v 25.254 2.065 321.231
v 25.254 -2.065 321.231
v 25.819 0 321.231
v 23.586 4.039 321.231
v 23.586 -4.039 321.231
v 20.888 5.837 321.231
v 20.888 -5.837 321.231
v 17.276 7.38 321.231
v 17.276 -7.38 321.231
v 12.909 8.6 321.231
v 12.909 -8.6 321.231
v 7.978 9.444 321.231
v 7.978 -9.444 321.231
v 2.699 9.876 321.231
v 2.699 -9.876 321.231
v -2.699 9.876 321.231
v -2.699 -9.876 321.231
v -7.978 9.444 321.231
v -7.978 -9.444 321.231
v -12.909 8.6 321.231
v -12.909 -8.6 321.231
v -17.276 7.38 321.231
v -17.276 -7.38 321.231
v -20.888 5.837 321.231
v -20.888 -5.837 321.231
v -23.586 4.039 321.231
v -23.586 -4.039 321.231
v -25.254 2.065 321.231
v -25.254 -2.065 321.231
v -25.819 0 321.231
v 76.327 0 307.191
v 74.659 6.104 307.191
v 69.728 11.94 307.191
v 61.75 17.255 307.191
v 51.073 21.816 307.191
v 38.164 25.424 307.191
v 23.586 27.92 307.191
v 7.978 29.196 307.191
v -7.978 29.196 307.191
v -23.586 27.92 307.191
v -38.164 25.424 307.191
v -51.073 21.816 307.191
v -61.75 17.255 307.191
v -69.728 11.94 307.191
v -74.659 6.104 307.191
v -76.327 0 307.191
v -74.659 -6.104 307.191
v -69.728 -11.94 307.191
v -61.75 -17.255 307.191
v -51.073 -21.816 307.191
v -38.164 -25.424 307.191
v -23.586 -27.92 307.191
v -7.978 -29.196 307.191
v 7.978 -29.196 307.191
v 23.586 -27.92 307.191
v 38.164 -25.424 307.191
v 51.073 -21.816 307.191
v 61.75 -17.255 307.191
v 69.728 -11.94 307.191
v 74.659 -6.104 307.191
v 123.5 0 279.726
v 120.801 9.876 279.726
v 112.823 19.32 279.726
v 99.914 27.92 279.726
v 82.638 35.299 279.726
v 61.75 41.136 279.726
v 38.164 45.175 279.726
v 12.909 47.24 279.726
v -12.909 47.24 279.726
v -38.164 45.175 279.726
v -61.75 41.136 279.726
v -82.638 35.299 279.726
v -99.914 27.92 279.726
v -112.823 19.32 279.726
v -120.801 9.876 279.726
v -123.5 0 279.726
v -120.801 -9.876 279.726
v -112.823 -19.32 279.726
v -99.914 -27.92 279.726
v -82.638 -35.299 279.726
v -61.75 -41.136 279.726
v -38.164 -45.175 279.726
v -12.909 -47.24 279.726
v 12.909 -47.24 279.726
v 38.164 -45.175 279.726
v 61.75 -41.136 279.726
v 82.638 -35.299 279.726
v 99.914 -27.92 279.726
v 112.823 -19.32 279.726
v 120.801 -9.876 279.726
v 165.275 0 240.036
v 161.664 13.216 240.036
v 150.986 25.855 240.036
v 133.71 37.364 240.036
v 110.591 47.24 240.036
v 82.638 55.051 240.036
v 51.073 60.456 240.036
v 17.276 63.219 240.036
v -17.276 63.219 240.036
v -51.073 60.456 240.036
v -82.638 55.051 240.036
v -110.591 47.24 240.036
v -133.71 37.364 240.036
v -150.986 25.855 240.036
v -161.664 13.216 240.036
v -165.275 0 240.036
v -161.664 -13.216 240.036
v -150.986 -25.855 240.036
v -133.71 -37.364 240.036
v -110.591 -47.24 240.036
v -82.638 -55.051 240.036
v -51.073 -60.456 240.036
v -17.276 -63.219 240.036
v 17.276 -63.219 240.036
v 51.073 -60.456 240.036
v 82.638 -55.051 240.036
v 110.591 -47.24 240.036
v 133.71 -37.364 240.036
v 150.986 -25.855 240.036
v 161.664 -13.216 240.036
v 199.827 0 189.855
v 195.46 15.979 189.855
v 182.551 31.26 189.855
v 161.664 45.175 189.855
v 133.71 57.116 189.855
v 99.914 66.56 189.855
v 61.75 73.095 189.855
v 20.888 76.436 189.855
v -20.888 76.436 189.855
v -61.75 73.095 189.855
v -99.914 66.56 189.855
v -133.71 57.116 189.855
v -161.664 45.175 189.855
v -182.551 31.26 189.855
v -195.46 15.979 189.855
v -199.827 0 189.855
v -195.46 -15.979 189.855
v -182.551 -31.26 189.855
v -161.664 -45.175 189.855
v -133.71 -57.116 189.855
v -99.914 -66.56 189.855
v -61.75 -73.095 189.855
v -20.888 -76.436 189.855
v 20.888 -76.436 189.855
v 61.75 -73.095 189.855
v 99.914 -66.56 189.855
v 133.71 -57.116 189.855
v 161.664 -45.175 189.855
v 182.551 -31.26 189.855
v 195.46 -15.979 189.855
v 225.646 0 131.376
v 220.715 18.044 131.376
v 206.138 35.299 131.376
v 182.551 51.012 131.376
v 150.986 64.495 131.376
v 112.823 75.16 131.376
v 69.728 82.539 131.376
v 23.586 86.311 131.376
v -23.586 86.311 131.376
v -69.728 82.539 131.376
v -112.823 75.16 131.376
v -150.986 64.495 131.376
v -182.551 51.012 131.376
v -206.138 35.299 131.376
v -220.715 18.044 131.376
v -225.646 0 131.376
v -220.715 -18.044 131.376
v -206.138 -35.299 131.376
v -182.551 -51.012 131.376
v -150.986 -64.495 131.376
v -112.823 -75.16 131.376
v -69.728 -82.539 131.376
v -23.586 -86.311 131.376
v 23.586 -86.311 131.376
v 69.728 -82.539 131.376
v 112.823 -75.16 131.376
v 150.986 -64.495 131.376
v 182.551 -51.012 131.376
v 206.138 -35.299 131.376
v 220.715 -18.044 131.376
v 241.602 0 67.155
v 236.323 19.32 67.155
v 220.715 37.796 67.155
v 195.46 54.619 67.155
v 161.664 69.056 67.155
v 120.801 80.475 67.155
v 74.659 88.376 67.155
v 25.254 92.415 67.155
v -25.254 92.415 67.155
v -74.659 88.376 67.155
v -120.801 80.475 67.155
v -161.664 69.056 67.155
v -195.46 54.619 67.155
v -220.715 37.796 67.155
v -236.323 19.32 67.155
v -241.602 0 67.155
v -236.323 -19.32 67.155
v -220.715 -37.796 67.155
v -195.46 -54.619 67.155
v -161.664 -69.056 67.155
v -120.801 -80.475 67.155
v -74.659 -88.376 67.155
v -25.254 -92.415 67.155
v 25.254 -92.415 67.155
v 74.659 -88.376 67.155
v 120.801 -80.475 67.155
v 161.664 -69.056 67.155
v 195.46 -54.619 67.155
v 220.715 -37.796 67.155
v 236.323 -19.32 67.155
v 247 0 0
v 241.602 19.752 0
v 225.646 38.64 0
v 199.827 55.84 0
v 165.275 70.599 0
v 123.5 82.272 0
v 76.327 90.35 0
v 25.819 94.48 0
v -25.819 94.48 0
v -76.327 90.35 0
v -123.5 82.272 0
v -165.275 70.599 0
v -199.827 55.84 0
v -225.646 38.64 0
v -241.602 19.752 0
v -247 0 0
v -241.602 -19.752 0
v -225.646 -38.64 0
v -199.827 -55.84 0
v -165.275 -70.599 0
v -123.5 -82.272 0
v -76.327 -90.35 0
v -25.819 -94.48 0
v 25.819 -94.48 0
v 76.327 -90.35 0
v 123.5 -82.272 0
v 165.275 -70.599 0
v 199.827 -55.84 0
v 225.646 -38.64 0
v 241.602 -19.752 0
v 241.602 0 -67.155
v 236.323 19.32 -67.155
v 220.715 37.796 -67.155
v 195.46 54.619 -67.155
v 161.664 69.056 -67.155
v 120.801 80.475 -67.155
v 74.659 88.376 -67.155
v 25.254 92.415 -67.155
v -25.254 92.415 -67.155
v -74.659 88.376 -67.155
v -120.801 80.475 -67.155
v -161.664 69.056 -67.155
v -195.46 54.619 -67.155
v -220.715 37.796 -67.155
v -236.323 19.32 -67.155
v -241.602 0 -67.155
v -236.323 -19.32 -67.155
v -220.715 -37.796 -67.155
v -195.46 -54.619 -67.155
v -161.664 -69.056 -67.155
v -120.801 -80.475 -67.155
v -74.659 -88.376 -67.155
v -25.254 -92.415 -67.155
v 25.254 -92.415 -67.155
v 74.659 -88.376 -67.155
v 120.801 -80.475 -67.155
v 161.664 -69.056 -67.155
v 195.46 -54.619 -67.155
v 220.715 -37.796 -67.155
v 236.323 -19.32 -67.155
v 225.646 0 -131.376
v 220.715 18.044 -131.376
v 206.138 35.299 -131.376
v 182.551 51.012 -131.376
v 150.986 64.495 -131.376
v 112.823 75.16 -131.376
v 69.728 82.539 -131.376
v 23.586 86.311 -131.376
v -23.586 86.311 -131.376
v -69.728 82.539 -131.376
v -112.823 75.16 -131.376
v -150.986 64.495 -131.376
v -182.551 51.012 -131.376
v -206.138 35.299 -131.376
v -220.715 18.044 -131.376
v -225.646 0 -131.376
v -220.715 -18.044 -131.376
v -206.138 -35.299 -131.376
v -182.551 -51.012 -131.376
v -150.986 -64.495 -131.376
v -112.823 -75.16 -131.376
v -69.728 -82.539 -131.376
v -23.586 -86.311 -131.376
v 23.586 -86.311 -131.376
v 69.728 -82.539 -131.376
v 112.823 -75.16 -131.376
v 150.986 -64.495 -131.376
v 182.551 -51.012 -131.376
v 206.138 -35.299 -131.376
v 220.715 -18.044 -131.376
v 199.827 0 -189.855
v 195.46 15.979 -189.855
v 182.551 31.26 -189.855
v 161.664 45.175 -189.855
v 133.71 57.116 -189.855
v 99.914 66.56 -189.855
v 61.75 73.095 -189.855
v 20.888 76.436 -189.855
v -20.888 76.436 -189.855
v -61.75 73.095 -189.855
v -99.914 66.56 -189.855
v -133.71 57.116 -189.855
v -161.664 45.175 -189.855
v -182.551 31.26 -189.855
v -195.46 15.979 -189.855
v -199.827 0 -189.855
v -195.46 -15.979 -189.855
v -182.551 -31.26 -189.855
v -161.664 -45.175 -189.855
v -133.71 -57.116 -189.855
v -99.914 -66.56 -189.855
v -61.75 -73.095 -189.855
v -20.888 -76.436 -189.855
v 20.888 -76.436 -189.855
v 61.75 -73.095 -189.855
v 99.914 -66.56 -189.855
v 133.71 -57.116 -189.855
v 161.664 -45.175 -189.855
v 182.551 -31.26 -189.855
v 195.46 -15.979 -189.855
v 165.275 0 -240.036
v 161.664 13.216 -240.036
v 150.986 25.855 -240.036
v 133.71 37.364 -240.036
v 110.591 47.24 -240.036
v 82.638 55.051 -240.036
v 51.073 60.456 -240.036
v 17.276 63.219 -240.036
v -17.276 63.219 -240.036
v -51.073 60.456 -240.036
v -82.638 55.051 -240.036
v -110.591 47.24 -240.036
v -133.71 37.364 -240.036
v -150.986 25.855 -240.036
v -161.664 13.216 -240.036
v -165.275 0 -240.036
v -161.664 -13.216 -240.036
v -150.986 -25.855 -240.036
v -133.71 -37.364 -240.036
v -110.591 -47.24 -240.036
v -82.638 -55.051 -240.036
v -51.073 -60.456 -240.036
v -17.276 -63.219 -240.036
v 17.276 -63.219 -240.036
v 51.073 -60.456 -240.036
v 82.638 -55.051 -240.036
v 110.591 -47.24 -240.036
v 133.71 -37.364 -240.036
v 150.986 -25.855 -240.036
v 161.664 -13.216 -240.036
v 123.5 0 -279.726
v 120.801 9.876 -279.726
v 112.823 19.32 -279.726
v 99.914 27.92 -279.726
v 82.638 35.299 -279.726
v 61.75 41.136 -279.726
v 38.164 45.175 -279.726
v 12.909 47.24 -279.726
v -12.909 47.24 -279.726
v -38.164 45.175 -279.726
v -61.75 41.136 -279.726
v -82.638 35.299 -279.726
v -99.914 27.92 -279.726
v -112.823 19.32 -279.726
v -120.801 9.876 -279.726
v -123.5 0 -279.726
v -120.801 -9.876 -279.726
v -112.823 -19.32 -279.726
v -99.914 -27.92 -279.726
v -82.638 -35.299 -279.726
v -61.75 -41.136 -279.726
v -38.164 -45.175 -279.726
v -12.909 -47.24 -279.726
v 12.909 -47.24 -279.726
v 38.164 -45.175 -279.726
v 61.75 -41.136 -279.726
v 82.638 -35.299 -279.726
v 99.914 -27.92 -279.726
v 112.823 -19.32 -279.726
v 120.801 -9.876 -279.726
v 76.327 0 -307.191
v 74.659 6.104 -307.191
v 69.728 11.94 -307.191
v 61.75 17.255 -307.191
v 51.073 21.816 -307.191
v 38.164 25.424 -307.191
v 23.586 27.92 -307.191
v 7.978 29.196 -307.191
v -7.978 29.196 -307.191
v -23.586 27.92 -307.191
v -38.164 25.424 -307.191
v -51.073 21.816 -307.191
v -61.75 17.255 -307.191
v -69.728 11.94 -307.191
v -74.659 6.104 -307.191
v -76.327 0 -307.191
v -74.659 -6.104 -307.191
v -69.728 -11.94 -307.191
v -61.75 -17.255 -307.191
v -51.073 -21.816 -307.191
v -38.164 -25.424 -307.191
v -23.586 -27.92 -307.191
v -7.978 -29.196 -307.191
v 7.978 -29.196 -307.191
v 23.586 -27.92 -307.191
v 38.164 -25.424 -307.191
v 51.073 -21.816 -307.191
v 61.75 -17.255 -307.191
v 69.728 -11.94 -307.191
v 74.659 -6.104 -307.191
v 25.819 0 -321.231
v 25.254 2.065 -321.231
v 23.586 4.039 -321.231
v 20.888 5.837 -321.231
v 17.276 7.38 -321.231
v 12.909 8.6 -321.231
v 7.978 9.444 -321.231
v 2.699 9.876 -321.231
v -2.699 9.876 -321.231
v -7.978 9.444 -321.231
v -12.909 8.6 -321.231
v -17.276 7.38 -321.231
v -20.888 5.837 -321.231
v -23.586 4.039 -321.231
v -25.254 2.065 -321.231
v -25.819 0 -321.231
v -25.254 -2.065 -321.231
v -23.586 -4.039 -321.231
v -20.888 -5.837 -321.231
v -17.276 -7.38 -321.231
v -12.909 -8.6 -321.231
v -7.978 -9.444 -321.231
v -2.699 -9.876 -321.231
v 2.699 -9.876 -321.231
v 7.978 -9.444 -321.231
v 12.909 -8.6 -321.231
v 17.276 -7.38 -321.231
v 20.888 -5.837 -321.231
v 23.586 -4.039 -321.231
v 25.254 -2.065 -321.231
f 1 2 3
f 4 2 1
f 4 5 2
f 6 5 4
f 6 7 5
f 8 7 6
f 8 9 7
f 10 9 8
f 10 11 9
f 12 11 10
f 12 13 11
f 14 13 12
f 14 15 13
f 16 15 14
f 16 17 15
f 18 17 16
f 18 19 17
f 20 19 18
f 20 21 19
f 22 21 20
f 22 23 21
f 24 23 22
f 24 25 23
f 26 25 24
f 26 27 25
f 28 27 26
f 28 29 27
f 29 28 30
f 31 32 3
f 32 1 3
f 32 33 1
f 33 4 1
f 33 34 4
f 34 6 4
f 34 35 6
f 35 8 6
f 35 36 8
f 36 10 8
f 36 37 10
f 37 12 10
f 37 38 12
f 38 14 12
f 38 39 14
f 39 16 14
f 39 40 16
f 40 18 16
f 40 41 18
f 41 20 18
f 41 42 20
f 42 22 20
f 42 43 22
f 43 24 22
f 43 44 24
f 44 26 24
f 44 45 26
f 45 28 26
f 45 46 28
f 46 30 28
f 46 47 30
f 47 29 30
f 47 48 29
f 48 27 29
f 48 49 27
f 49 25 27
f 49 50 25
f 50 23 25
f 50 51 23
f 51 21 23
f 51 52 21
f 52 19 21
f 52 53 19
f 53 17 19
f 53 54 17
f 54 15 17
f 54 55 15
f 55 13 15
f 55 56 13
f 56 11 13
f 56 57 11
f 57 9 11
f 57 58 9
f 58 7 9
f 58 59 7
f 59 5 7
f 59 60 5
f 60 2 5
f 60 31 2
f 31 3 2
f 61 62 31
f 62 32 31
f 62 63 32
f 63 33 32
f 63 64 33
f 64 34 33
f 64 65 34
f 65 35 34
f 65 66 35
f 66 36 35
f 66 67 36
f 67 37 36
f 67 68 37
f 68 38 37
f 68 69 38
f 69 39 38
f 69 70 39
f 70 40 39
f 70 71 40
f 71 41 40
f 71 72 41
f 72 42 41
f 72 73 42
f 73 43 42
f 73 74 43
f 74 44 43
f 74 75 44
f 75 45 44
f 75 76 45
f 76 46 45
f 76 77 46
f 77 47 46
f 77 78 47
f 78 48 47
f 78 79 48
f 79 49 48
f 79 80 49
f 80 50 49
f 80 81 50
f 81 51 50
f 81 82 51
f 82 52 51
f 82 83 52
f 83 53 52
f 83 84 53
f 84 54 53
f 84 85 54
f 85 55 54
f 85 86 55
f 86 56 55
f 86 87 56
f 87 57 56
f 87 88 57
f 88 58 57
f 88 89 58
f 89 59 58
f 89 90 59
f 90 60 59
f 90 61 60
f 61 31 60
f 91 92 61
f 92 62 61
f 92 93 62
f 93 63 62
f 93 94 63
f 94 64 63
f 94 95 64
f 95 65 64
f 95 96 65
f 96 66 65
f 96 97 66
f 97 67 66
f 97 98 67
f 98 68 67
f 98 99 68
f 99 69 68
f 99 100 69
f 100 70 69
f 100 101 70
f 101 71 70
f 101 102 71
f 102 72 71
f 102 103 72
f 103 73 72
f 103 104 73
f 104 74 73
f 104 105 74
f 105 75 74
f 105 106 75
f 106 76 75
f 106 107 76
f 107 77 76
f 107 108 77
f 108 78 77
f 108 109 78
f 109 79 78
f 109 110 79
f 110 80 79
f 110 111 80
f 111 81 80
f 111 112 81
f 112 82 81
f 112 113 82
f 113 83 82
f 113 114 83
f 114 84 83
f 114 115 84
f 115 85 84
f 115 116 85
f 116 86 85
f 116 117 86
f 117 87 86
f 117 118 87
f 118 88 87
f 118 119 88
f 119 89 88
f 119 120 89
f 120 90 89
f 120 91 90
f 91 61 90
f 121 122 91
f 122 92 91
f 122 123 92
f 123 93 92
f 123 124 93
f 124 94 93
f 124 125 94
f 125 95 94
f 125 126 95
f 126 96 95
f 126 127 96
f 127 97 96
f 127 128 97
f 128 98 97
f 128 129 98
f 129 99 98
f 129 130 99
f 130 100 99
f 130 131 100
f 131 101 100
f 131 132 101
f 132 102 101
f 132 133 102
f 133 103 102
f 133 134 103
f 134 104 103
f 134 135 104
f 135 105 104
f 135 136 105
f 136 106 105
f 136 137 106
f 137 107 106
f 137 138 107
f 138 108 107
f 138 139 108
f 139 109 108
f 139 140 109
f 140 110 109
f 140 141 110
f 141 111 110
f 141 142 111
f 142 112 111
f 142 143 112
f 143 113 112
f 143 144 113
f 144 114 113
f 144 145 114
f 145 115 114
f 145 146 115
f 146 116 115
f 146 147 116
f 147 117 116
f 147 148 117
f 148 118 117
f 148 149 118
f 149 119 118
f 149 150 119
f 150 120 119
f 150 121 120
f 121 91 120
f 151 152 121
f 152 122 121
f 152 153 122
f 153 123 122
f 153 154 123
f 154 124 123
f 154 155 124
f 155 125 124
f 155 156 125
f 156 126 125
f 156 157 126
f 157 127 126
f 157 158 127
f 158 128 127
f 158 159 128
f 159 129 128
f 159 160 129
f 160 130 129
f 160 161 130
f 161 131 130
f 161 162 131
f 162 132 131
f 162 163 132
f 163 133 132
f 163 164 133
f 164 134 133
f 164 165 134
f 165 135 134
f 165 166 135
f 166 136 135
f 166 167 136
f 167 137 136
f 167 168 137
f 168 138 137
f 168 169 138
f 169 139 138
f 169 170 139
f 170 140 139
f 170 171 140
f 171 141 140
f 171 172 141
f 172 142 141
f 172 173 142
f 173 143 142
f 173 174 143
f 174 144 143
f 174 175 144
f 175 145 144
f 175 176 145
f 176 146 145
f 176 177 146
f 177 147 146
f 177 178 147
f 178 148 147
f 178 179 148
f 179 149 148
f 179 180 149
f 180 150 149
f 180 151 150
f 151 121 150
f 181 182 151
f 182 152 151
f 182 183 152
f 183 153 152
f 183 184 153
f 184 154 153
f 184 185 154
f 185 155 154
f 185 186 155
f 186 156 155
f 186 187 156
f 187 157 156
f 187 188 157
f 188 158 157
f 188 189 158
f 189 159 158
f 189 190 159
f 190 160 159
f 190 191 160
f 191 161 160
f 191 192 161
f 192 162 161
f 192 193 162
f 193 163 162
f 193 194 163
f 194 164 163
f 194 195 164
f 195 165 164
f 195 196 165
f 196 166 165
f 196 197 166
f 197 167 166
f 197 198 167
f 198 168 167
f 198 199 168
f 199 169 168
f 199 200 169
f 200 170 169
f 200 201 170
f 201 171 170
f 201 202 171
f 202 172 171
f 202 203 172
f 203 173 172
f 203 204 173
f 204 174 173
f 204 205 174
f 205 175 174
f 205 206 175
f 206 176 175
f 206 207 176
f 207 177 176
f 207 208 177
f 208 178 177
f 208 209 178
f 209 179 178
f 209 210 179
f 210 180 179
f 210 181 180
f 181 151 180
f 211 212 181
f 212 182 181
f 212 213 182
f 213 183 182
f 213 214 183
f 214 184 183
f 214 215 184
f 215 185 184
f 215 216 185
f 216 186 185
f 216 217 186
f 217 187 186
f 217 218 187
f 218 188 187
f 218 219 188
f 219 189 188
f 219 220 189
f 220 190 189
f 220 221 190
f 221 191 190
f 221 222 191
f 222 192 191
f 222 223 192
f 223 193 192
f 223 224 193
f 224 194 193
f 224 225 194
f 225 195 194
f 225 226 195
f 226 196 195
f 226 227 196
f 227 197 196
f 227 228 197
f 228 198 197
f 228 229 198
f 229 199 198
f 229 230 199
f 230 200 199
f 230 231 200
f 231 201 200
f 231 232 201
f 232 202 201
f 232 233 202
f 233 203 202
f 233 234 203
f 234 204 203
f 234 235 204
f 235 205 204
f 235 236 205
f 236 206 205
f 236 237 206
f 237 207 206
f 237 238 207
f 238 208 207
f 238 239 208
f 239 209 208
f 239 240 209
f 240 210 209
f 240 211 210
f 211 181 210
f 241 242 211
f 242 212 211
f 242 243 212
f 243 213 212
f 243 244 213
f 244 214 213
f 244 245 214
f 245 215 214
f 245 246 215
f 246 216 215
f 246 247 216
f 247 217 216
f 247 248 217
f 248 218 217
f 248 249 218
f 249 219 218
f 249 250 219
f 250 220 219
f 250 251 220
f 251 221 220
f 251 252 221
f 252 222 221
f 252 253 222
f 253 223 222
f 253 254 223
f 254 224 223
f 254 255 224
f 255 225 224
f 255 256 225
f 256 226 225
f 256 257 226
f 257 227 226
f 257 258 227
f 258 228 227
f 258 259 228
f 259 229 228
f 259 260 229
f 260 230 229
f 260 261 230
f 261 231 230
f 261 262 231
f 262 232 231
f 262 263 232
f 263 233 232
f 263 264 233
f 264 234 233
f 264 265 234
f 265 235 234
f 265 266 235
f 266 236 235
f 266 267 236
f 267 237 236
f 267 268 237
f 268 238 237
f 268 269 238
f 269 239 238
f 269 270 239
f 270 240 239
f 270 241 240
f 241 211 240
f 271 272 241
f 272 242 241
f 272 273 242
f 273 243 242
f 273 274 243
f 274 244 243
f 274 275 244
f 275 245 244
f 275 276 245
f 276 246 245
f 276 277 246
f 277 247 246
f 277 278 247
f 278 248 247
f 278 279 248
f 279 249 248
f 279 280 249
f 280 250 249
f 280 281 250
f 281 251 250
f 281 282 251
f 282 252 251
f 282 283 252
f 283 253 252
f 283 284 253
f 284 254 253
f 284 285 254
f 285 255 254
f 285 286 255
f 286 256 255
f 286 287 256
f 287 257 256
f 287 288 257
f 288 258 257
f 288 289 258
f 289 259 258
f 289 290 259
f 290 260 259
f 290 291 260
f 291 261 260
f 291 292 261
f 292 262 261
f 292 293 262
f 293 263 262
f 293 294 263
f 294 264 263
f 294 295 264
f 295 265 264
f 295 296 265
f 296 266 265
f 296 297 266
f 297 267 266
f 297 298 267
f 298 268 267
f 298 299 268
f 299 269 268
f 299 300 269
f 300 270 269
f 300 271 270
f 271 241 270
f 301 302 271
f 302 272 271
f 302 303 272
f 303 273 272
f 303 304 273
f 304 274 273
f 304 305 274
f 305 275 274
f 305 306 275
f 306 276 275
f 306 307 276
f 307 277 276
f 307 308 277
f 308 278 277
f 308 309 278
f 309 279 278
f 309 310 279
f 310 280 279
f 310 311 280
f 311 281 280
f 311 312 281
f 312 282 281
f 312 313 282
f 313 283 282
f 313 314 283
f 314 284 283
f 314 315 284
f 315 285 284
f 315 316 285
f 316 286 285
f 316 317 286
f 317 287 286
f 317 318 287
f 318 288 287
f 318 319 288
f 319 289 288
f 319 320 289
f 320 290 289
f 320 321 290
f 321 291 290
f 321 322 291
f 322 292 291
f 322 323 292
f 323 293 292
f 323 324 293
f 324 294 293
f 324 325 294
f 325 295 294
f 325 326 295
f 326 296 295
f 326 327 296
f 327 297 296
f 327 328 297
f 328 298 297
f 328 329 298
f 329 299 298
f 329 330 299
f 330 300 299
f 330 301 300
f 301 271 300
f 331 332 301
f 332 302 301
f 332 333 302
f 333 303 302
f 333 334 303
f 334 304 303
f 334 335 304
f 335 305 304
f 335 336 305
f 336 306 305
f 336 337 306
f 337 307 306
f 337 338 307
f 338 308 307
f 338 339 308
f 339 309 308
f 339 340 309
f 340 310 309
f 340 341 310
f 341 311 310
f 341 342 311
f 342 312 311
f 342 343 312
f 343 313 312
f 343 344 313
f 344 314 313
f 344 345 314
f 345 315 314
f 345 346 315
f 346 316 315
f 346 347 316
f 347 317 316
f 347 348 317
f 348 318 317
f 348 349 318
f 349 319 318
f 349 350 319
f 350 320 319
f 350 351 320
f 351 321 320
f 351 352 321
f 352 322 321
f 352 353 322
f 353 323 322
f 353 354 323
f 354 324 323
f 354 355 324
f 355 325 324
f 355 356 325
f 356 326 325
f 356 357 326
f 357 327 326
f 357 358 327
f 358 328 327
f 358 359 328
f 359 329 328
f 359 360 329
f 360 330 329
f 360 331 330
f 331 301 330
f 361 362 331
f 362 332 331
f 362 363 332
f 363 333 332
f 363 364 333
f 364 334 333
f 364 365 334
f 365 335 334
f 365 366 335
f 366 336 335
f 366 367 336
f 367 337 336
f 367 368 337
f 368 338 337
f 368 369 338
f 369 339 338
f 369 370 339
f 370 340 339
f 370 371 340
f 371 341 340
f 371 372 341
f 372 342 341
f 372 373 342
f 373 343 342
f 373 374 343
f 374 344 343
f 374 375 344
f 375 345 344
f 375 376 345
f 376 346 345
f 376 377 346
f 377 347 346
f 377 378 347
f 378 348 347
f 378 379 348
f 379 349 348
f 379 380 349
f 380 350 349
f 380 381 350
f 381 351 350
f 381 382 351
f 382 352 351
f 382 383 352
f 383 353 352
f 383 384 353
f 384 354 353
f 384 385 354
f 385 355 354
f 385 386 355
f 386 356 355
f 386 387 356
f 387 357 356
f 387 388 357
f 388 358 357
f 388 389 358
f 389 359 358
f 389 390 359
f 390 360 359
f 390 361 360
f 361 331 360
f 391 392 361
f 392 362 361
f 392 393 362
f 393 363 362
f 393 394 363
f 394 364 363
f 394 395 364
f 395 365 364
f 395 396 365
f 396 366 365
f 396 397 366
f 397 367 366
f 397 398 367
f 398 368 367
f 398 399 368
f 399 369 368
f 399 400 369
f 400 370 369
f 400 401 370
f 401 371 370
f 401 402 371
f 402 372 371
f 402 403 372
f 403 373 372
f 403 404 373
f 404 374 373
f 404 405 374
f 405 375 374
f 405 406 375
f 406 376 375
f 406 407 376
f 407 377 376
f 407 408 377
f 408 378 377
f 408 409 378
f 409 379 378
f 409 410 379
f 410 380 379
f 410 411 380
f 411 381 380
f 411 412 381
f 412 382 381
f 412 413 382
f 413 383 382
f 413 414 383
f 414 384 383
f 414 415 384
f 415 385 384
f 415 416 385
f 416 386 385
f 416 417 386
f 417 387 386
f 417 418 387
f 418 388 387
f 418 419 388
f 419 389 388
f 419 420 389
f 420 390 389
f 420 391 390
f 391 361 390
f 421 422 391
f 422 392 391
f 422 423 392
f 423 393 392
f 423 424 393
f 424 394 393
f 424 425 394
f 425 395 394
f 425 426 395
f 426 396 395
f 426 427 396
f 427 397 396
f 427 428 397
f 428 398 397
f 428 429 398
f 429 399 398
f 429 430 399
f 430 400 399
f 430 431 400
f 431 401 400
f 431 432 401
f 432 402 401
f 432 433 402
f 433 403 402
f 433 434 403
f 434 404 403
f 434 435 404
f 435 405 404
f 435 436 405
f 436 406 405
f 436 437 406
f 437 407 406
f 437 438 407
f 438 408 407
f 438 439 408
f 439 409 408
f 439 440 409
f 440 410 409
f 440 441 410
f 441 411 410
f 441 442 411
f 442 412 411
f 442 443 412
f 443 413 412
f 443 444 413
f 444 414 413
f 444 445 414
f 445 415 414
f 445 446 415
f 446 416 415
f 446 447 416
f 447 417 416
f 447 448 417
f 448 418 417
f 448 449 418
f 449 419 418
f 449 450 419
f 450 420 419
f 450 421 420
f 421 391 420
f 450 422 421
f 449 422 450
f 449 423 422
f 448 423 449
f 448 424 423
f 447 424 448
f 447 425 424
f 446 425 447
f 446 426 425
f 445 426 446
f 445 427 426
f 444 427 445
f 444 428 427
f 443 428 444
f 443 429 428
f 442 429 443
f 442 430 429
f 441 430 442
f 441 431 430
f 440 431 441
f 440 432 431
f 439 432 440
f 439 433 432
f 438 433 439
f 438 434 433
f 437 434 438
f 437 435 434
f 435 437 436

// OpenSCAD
// Generated by SolidPython 1.0.1 on 2020-07-29 00:46:50


scale(v = [13, 5, 17]) {
	sphere(r = 19);
}
/***********************************************
*********      SolidPython code:      **********
************************************************
 
# import packages: SolidPython
from solid import *
from solid.utils import *
from itertools import chain, combinations, permutations


class Resize:

    def __init__(self, scad_file):
        self.scad_file = scad_file
        #self.scad_file = import_scad(scad_file)
        # cone/cylinder param:
        self.r1 = 0
        self.r2 = 0
        self.h = 0
        # rectangular prism param:
        self.w = 0
        self.l = 0
        # ellipse param:
        self.r = 0

    # import OpenScad code (file name corresponds to shape)


    # classify shape + parameters
    def assign(self, param1, param2, param3):
        if self.scad_file == 'cone.scad':
            self.r1 = param1
            self.r2 = param2
            self.h = param3
        elif self.scad_file == 'cylinder.scad':
            self.r1 = param1
            self.r2 = param2
            self.h = param3
        elif self.scad_file == 'rectangularPrism.scad':
            self.h = param1
            self.l = param2
            self.w = param3
        else:
            self.r = param1
            self.h = param2

    # resize parameters
    def iterate(self):
        x = range(3, 20, 2)
        i = 1
        if self.scad_file == 'cone.scad':
            tempList = list(permutations(x, 2))
            for temp in tempList:
                param1 = temp[0]
                param2 = temp[1]
                filepath = 'produced_scad_files/' + 'cone' + str(param1) + '_' + str(param2) + '_' + '.scad'
                scad_render_to_file(cylinder(h=param1, r1=param2, r2=0), filepath)

        elif self.scad_file == 'cylinder.scad':
            tempList = list(permutations(x, 3))
            for temp in tempList:
                param1 = temp[0]
                param2 = temp[1]
                filepath = 'produced_scad_files/' + 'cylinder' + str(param1) + '_' + str(param2) + '_' + '.scad'
                scad_render_to_file(cylinder(h=param1, r1=param2, r2=param2), filepath)

        elif self.scad_file == 'rectangularPrism.scad':
            tempList = list(permutations(x, 3))
            for temp in tempList:
                param1 = temp[0]
                param2 = temp[1]
                param3 = temp[2]
                filepath = 'produced_scad_files/' + 'rectangularPrism' + str(param1) + '_' + str(param2) + '_' + str(
                    param3) + '.scad'
                scad_render_to_file(cube(size=(param1, param2, param3)), filepath)

        elif self.scad_file == 'ellipse.scad':
            tempList = list(permutations(x, 4))
            for temp in tempList:
                param1 = temp[0]
                param2 = temp[1]
                param3 = temp[2]
                param4 = temp[3]
                filepath = 'produced_scad_files/' + 'ellipse' + str(param1) + '_' + str(param2) + '_' + str(param3) + '_' + str(param4) + '.scad'
                scad_render_to_file(scale([param1, param2, param3])(sphere(r=param4)), filepath)

    def render_to_scadfile(self):
        scad_render_to_file(scad, 'example.scad') 
 
************************************************/
